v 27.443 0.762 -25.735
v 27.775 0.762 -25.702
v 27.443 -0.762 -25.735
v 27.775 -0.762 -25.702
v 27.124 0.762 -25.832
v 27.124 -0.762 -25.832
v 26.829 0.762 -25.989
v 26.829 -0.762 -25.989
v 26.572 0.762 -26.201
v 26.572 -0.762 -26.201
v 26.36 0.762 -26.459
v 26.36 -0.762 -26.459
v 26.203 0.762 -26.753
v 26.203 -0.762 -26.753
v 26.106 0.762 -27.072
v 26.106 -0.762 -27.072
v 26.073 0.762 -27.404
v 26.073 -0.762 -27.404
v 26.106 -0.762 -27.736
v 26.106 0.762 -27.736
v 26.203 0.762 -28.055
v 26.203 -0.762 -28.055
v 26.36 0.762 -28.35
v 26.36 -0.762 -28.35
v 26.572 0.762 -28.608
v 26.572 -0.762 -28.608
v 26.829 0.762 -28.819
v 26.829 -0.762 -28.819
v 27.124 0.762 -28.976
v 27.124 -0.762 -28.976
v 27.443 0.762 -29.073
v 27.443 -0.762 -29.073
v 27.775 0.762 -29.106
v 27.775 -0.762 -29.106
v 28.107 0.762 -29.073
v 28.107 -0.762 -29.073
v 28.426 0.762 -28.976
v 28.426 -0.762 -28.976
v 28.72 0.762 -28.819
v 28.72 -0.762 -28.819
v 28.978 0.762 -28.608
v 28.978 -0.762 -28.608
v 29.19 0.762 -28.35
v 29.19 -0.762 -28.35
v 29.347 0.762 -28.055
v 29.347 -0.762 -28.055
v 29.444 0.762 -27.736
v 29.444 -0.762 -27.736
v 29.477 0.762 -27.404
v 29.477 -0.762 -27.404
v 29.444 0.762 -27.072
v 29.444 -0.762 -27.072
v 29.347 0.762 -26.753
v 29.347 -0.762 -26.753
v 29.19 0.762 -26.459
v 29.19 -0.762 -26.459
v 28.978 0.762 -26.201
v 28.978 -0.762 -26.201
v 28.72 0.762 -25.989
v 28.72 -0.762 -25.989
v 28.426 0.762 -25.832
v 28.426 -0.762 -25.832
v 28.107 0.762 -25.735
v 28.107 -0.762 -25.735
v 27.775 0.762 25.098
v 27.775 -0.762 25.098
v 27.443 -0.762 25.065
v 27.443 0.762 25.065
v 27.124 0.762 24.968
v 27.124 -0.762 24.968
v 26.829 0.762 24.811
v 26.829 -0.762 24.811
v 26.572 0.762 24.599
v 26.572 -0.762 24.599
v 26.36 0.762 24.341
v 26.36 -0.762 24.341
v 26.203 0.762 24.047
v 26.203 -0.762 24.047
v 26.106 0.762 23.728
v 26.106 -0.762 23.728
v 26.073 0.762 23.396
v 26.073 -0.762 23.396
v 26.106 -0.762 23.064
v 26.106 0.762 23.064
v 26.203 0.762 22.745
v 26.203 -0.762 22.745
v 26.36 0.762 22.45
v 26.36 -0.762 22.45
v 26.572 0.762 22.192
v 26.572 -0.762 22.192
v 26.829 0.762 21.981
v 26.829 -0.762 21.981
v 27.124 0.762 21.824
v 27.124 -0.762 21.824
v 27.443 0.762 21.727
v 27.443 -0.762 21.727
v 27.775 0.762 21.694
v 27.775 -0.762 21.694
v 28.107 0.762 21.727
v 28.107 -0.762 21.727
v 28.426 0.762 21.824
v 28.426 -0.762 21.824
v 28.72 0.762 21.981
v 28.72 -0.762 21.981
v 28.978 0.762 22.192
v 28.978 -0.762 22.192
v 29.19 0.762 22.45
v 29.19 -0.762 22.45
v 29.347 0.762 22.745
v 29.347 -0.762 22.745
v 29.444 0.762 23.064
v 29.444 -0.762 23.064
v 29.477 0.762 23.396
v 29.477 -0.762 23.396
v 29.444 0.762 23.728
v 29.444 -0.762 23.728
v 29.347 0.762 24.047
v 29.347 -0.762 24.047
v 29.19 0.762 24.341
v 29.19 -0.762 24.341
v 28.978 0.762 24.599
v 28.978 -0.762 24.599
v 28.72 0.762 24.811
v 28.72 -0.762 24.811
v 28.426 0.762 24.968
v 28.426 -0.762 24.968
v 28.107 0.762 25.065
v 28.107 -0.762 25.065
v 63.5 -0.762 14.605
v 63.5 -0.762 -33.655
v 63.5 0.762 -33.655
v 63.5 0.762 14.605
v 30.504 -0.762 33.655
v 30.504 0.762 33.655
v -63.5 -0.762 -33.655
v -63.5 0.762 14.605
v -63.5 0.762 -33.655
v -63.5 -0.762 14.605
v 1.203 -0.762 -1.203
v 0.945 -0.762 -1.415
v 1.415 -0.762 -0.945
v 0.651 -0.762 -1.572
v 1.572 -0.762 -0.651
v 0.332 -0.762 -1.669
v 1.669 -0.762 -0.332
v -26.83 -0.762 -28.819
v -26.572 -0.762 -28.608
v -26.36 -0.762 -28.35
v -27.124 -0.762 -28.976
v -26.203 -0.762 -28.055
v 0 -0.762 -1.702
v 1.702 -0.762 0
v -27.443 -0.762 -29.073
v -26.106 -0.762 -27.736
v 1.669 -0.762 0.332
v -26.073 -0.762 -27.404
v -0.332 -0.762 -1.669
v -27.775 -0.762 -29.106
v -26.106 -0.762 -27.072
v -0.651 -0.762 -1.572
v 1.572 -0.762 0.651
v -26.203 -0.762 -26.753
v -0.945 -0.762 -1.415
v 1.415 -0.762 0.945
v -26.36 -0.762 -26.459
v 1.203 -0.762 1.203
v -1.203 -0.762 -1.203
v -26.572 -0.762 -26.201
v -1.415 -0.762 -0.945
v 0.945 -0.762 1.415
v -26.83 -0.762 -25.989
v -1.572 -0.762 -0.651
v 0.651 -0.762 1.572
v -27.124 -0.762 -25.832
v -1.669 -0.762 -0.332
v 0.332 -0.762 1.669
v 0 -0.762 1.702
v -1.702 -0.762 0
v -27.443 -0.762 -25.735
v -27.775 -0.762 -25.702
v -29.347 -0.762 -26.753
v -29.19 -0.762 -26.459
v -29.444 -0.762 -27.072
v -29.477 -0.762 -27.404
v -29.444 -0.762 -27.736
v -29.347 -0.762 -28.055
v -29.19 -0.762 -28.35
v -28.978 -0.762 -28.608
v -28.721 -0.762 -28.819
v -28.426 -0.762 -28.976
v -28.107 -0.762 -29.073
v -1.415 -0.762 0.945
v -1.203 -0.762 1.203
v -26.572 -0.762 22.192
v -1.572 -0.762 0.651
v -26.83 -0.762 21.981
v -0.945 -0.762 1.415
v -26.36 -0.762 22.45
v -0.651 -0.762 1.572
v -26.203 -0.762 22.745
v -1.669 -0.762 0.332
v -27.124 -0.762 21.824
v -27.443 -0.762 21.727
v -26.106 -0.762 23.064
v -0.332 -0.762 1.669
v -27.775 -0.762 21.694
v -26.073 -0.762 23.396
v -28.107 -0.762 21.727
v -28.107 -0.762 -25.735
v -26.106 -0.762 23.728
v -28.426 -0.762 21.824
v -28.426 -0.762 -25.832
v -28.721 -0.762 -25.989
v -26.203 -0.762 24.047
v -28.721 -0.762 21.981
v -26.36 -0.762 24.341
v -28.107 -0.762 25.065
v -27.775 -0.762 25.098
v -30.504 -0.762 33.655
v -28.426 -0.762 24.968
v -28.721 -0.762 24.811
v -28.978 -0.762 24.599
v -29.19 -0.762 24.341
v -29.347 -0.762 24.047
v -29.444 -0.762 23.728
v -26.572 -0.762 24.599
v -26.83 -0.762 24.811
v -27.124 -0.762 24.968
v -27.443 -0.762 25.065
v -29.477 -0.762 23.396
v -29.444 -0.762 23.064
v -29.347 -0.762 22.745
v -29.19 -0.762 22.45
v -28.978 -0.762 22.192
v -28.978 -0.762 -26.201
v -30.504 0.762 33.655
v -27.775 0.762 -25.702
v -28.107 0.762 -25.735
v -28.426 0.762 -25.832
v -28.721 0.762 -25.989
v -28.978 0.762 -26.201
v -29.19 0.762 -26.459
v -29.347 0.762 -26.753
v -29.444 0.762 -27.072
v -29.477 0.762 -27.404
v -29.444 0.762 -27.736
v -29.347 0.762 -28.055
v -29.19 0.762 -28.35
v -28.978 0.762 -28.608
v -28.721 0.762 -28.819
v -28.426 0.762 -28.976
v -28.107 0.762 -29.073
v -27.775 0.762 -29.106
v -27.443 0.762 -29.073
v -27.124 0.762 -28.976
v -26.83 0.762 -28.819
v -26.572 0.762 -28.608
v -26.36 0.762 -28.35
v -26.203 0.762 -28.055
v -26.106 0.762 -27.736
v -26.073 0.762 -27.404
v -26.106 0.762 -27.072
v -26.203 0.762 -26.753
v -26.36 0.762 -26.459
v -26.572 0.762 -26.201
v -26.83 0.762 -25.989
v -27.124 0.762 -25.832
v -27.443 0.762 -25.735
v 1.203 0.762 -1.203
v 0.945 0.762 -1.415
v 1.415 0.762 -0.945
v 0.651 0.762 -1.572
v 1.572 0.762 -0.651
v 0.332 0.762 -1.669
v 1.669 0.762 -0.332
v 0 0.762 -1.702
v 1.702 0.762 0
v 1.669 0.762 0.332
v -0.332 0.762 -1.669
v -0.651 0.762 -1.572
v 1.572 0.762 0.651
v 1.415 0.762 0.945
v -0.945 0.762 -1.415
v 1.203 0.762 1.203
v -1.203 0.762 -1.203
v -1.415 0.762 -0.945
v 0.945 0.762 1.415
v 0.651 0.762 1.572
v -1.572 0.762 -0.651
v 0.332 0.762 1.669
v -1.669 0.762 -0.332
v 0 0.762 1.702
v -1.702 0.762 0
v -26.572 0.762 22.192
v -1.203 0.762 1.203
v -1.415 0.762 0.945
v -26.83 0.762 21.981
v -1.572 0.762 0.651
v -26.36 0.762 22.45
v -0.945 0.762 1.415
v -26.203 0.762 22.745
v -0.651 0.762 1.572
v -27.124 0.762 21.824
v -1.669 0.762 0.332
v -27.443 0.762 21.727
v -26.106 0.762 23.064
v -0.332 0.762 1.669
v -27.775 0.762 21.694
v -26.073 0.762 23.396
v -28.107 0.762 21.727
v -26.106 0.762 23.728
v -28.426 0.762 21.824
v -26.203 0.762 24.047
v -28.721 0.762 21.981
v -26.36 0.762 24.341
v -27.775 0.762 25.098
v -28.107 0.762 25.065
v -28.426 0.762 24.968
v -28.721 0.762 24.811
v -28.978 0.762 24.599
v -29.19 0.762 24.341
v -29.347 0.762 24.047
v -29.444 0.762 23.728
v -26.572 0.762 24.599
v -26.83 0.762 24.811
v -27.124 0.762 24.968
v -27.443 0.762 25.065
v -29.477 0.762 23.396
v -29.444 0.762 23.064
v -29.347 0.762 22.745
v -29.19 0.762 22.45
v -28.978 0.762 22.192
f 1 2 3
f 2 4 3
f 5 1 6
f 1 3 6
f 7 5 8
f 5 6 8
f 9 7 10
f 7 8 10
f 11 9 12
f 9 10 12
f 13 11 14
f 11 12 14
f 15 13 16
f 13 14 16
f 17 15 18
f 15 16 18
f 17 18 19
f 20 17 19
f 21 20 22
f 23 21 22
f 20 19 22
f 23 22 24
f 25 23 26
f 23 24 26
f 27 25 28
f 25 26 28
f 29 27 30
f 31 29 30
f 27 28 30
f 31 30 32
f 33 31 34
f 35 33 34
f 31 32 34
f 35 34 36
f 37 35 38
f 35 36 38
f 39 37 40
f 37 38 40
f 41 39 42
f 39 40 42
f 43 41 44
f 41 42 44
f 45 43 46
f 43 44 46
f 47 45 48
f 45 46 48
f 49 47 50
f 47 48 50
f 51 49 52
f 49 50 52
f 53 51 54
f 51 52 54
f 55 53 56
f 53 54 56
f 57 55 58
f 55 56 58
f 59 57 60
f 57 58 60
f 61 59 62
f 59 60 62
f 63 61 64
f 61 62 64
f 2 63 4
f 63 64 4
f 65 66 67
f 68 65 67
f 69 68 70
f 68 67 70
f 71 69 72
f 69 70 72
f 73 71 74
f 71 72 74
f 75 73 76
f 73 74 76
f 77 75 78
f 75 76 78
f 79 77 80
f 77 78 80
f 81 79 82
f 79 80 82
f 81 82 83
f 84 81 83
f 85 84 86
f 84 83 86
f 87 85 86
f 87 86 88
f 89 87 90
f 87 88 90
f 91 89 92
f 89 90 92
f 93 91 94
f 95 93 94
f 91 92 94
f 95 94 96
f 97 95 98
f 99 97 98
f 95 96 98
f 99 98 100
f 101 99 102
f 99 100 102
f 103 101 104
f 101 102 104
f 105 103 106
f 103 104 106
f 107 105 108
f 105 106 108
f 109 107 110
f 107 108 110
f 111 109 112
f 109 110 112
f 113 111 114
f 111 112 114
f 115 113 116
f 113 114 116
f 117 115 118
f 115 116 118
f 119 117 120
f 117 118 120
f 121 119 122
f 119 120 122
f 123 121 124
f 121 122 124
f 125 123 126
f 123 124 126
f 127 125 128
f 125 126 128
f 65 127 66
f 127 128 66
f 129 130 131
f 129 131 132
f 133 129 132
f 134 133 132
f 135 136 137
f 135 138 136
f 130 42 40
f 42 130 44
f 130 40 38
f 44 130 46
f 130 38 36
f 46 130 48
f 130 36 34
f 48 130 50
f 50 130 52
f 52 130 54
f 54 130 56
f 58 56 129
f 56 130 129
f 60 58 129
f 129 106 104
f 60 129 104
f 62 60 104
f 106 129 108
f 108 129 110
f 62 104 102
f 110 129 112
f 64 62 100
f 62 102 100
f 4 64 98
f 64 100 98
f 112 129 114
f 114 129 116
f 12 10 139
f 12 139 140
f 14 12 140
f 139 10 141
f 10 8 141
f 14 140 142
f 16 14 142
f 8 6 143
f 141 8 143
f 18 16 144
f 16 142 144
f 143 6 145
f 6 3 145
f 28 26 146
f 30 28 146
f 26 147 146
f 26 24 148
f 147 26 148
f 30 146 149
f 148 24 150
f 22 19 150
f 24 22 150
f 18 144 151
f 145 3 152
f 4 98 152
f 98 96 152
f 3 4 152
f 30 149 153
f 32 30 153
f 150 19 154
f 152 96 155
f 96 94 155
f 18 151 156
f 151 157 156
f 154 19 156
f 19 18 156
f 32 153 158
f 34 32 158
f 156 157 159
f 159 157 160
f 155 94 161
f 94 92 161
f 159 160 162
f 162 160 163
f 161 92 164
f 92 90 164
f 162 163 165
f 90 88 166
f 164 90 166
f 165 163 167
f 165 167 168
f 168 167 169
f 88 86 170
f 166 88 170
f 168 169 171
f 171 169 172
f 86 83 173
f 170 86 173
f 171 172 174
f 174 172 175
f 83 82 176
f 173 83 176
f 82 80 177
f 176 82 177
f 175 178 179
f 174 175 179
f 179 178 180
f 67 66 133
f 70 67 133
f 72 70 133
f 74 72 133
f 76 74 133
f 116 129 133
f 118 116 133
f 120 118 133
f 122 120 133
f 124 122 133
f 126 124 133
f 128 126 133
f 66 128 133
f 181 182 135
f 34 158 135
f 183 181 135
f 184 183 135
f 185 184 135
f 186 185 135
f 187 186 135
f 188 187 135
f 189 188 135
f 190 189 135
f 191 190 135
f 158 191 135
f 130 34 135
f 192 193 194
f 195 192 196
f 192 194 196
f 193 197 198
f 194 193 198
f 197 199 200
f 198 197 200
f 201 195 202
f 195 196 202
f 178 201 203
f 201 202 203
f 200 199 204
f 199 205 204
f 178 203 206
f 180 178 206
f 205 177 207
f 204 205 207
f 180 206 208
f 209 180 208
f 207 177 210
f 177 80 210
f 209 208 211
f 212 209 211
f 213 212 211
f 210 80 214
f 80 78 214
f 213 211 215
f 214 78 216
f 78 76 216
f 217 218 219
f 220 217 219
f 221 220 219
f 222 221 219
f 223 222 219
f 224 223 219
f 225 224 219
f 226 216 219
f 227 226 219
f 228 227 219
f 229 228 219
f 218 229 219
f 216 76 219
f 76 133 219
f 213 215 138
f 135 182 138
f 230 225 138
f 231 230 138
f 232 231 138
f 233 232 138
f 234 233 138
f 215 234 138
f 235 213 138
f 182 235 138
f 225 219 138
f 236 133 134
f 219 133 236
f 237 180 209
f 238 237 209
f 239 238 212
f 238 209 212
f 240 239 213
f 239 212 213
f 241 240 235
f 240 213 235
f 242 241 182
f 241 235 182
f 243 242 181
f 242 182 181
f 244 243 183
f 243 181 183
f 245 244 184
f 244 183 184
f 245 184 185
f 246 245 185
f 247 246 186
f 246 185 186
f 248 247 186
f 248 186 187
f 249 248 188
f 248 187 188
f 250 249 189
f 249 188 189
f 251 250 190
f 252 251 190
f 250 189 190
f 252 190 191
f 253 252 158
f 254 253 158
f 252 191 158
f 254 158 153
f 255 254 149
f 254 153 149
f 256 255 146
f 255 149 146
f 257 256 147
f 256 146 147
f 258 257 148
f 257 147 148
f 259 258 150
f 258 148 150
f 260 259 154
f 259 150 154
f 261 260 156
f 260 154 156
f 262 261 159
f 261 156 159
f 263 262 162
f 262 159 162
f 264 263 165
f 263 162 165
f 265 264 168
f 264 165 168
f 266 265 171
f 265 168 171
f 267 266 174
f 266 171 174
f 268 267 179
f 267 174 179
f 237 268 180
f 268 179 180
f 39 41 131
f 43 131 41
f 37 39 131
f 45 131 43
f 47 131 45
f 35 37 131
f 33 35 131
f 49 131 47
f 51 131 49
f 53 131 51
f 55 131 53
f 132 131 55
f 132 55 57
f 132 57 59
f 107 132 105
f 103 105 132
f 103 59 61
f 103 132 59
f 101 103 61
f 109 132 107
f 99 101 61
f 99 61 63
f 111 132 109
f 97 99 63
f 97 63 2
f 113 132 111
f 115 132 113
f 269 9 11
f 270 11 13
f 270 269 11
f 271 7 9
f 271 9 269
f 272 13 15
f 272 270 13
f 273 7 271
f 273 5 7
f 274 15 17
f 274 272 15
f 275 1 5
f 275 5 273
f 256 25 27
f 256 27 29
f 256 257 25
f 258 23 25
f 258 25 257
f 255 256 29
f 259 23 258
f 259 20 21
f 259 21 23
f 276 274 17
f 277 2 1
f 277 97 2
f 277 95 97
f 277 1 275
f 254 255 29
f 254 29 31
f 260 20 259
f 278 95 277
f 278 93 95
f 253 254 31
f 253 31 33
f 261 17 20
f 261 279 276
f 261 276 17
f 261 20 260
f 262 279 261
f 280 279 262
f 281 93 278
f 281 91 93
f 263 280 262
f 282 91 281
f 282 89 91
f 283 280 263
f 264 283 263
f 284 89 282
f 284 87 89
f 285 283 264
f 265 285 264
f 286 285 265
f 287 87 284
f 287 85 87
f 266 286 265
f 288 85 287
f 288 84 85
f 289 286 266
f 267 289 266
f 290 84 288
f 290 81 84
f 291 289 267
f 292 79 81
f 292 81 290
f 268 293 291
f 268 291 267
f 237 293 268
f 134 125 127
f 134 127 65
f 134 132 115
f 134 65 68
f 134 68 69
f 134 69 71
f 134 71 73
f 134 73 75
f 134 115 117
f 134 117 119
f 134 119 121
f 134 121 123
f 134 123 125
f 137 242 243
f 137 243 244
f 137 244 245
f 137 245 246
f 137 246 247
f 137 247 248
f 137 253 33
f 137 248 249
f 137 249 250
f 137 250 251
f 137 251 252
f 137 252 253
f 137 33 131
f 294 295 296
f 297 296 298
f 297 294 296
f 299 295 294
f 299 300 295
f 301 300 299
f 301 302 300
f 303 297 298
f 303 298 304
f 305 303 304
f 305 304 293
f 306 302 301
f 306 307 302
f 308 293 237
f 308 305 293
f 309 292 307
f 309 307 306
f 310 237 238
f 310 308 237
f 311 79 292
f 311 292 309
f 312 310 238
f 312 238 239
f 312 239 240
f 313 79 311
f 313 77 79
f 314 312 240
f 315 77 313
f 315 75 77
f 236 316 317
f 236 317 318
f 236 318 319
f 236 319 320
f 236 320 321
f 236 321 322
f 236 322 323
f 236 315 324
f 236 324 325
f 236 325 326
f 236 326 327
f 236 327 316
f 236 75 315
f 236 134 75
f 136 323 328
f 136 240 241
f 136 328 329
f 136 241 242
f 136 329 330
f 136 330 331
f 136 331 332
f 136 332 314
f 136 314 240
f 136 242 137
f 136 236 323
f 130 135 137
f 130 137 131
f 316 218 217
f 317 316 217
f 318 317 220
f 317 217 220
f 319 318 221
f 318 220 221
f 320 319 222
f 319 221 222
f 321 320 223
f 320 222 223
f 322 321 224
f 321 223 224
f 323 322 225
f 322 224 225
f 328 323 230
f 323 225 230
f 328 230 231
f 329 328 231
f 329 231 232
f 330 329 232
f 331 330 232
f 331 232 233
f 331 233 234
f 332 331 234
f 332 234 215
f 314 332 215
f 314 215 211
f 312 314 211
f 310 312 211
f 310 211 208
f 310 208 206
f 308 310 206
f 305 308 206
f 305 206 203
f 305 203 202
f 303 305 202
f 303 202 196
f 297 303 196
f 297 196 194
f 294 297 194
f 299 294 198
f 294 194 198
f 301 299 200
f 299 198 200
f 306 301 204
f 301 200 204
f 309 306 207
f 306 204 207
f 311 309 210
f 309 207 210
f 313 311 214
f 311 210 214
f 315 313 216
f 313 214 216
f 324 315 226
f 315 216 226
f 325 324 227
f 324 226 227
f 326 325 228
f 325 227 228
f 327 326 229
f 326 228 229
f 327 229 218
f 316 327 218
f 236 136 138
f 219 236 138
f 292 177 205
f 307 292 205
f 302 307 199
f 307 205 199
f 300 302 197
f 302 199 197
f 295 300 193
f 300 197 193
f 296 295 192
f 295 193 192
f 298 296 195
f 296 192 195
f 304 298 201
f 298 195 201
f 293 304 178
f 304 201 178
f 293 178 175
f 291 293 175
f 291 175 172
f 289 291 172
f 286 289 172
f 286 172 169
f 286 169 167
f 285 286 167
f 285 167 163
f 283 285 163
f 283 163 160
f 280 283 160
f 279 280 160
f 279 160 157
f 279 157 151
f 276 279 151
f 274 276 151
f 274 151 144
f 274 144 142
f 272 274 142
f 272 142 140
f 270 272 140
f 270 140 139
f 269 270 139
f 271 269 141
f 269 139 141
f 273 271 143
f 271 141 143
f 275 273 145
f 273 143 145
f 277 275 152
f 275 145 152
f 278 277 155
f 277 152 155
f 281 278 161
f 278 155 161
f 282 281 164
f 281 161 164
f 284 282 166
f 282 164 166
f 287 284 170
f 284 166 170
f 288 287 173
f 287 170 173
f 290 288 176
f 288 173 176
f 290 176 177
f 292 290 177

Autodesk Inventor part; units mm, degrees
ref_plane "YZ Plane" through (0, 0, 0) normal (1, 0, 0) x (0, 1, 0)
ref_plane "XZ Plane" through (0, 0, 0) normal (0, 1, 0) x (-1, 0, 0)
ref_plane "XY Plane" through (0, 0, 0) normal (0, 0, 1) x (1, 0, 0)
sketch "Sketch1" plane through (0, 0, 0) normal (0, 1, 0) x (-1, 0, 0)
  line L0 (-63.5, 33.655) -> (63.5, 33.655)
  line L1 (63.5, 33.655) -> (63.5, -33.655)
  line L2 (63.5, -33.655) -> (-63.5, -33.655)
  line L3 (-63.5, -33.655) -> (-63.5, 33.655)
  line L4 (-63.5, 33.655) -> (63.5, -33.655) construction
  line L5 (63.5, 33.655) -> (-63.5, -33.655) construction
  point P0 (0, 0)
  dimension "d0" = 127
  dimension "d1" = 67.31
extrude "Extrusion1" add sketch "Sketch1" along normal mid plane 1.524
chamfer "Chamfer1" distance 19.05 angle 60 1 edges at (-63.5, 0, 33.655) measured on face at (-63.5, -0.254, 11.2183)
sketch "Sketch3" plane through (0, 0.762, 0) normal (0, 1, 0) x (1, 0, 0)
  circle A0 centre (27.7749, 27.4042) radius 1.7018 projected
  circle A1 centre (27.7749, -23.3958) radius 1.7018 projected
  circle A2 centre (-27.7751, -23.3958) radius 1.7018 projected
  circle A3 centre (-27.7751, 27.4042) radius 1.7018 projected
  point P0 (0, 0)
hole "Hole2" at (0, 0.762, 0) at (27.7749, 0.762, -27.4042) at (27.7749, 0.762, 23.3958) at (-27.7751, 0.762, 23.3958) at (-27.7751, 0.762, -27.4042) direction (0, -1, 0) diameter 3.4036 end through all clearance for "Flat Head Machine Screw" size "M3" standard "Ansi Metric M Profile"
chamfer "Chamfer2" distance 19.05 angle 60 1 edges at (63.5, 0, 33.655) measured on face at (63.5, 0.254, 11.2183)
properties part number "DPLX_P022 Spark Gap Shielding Top" material "Polyethylene, High Density"
